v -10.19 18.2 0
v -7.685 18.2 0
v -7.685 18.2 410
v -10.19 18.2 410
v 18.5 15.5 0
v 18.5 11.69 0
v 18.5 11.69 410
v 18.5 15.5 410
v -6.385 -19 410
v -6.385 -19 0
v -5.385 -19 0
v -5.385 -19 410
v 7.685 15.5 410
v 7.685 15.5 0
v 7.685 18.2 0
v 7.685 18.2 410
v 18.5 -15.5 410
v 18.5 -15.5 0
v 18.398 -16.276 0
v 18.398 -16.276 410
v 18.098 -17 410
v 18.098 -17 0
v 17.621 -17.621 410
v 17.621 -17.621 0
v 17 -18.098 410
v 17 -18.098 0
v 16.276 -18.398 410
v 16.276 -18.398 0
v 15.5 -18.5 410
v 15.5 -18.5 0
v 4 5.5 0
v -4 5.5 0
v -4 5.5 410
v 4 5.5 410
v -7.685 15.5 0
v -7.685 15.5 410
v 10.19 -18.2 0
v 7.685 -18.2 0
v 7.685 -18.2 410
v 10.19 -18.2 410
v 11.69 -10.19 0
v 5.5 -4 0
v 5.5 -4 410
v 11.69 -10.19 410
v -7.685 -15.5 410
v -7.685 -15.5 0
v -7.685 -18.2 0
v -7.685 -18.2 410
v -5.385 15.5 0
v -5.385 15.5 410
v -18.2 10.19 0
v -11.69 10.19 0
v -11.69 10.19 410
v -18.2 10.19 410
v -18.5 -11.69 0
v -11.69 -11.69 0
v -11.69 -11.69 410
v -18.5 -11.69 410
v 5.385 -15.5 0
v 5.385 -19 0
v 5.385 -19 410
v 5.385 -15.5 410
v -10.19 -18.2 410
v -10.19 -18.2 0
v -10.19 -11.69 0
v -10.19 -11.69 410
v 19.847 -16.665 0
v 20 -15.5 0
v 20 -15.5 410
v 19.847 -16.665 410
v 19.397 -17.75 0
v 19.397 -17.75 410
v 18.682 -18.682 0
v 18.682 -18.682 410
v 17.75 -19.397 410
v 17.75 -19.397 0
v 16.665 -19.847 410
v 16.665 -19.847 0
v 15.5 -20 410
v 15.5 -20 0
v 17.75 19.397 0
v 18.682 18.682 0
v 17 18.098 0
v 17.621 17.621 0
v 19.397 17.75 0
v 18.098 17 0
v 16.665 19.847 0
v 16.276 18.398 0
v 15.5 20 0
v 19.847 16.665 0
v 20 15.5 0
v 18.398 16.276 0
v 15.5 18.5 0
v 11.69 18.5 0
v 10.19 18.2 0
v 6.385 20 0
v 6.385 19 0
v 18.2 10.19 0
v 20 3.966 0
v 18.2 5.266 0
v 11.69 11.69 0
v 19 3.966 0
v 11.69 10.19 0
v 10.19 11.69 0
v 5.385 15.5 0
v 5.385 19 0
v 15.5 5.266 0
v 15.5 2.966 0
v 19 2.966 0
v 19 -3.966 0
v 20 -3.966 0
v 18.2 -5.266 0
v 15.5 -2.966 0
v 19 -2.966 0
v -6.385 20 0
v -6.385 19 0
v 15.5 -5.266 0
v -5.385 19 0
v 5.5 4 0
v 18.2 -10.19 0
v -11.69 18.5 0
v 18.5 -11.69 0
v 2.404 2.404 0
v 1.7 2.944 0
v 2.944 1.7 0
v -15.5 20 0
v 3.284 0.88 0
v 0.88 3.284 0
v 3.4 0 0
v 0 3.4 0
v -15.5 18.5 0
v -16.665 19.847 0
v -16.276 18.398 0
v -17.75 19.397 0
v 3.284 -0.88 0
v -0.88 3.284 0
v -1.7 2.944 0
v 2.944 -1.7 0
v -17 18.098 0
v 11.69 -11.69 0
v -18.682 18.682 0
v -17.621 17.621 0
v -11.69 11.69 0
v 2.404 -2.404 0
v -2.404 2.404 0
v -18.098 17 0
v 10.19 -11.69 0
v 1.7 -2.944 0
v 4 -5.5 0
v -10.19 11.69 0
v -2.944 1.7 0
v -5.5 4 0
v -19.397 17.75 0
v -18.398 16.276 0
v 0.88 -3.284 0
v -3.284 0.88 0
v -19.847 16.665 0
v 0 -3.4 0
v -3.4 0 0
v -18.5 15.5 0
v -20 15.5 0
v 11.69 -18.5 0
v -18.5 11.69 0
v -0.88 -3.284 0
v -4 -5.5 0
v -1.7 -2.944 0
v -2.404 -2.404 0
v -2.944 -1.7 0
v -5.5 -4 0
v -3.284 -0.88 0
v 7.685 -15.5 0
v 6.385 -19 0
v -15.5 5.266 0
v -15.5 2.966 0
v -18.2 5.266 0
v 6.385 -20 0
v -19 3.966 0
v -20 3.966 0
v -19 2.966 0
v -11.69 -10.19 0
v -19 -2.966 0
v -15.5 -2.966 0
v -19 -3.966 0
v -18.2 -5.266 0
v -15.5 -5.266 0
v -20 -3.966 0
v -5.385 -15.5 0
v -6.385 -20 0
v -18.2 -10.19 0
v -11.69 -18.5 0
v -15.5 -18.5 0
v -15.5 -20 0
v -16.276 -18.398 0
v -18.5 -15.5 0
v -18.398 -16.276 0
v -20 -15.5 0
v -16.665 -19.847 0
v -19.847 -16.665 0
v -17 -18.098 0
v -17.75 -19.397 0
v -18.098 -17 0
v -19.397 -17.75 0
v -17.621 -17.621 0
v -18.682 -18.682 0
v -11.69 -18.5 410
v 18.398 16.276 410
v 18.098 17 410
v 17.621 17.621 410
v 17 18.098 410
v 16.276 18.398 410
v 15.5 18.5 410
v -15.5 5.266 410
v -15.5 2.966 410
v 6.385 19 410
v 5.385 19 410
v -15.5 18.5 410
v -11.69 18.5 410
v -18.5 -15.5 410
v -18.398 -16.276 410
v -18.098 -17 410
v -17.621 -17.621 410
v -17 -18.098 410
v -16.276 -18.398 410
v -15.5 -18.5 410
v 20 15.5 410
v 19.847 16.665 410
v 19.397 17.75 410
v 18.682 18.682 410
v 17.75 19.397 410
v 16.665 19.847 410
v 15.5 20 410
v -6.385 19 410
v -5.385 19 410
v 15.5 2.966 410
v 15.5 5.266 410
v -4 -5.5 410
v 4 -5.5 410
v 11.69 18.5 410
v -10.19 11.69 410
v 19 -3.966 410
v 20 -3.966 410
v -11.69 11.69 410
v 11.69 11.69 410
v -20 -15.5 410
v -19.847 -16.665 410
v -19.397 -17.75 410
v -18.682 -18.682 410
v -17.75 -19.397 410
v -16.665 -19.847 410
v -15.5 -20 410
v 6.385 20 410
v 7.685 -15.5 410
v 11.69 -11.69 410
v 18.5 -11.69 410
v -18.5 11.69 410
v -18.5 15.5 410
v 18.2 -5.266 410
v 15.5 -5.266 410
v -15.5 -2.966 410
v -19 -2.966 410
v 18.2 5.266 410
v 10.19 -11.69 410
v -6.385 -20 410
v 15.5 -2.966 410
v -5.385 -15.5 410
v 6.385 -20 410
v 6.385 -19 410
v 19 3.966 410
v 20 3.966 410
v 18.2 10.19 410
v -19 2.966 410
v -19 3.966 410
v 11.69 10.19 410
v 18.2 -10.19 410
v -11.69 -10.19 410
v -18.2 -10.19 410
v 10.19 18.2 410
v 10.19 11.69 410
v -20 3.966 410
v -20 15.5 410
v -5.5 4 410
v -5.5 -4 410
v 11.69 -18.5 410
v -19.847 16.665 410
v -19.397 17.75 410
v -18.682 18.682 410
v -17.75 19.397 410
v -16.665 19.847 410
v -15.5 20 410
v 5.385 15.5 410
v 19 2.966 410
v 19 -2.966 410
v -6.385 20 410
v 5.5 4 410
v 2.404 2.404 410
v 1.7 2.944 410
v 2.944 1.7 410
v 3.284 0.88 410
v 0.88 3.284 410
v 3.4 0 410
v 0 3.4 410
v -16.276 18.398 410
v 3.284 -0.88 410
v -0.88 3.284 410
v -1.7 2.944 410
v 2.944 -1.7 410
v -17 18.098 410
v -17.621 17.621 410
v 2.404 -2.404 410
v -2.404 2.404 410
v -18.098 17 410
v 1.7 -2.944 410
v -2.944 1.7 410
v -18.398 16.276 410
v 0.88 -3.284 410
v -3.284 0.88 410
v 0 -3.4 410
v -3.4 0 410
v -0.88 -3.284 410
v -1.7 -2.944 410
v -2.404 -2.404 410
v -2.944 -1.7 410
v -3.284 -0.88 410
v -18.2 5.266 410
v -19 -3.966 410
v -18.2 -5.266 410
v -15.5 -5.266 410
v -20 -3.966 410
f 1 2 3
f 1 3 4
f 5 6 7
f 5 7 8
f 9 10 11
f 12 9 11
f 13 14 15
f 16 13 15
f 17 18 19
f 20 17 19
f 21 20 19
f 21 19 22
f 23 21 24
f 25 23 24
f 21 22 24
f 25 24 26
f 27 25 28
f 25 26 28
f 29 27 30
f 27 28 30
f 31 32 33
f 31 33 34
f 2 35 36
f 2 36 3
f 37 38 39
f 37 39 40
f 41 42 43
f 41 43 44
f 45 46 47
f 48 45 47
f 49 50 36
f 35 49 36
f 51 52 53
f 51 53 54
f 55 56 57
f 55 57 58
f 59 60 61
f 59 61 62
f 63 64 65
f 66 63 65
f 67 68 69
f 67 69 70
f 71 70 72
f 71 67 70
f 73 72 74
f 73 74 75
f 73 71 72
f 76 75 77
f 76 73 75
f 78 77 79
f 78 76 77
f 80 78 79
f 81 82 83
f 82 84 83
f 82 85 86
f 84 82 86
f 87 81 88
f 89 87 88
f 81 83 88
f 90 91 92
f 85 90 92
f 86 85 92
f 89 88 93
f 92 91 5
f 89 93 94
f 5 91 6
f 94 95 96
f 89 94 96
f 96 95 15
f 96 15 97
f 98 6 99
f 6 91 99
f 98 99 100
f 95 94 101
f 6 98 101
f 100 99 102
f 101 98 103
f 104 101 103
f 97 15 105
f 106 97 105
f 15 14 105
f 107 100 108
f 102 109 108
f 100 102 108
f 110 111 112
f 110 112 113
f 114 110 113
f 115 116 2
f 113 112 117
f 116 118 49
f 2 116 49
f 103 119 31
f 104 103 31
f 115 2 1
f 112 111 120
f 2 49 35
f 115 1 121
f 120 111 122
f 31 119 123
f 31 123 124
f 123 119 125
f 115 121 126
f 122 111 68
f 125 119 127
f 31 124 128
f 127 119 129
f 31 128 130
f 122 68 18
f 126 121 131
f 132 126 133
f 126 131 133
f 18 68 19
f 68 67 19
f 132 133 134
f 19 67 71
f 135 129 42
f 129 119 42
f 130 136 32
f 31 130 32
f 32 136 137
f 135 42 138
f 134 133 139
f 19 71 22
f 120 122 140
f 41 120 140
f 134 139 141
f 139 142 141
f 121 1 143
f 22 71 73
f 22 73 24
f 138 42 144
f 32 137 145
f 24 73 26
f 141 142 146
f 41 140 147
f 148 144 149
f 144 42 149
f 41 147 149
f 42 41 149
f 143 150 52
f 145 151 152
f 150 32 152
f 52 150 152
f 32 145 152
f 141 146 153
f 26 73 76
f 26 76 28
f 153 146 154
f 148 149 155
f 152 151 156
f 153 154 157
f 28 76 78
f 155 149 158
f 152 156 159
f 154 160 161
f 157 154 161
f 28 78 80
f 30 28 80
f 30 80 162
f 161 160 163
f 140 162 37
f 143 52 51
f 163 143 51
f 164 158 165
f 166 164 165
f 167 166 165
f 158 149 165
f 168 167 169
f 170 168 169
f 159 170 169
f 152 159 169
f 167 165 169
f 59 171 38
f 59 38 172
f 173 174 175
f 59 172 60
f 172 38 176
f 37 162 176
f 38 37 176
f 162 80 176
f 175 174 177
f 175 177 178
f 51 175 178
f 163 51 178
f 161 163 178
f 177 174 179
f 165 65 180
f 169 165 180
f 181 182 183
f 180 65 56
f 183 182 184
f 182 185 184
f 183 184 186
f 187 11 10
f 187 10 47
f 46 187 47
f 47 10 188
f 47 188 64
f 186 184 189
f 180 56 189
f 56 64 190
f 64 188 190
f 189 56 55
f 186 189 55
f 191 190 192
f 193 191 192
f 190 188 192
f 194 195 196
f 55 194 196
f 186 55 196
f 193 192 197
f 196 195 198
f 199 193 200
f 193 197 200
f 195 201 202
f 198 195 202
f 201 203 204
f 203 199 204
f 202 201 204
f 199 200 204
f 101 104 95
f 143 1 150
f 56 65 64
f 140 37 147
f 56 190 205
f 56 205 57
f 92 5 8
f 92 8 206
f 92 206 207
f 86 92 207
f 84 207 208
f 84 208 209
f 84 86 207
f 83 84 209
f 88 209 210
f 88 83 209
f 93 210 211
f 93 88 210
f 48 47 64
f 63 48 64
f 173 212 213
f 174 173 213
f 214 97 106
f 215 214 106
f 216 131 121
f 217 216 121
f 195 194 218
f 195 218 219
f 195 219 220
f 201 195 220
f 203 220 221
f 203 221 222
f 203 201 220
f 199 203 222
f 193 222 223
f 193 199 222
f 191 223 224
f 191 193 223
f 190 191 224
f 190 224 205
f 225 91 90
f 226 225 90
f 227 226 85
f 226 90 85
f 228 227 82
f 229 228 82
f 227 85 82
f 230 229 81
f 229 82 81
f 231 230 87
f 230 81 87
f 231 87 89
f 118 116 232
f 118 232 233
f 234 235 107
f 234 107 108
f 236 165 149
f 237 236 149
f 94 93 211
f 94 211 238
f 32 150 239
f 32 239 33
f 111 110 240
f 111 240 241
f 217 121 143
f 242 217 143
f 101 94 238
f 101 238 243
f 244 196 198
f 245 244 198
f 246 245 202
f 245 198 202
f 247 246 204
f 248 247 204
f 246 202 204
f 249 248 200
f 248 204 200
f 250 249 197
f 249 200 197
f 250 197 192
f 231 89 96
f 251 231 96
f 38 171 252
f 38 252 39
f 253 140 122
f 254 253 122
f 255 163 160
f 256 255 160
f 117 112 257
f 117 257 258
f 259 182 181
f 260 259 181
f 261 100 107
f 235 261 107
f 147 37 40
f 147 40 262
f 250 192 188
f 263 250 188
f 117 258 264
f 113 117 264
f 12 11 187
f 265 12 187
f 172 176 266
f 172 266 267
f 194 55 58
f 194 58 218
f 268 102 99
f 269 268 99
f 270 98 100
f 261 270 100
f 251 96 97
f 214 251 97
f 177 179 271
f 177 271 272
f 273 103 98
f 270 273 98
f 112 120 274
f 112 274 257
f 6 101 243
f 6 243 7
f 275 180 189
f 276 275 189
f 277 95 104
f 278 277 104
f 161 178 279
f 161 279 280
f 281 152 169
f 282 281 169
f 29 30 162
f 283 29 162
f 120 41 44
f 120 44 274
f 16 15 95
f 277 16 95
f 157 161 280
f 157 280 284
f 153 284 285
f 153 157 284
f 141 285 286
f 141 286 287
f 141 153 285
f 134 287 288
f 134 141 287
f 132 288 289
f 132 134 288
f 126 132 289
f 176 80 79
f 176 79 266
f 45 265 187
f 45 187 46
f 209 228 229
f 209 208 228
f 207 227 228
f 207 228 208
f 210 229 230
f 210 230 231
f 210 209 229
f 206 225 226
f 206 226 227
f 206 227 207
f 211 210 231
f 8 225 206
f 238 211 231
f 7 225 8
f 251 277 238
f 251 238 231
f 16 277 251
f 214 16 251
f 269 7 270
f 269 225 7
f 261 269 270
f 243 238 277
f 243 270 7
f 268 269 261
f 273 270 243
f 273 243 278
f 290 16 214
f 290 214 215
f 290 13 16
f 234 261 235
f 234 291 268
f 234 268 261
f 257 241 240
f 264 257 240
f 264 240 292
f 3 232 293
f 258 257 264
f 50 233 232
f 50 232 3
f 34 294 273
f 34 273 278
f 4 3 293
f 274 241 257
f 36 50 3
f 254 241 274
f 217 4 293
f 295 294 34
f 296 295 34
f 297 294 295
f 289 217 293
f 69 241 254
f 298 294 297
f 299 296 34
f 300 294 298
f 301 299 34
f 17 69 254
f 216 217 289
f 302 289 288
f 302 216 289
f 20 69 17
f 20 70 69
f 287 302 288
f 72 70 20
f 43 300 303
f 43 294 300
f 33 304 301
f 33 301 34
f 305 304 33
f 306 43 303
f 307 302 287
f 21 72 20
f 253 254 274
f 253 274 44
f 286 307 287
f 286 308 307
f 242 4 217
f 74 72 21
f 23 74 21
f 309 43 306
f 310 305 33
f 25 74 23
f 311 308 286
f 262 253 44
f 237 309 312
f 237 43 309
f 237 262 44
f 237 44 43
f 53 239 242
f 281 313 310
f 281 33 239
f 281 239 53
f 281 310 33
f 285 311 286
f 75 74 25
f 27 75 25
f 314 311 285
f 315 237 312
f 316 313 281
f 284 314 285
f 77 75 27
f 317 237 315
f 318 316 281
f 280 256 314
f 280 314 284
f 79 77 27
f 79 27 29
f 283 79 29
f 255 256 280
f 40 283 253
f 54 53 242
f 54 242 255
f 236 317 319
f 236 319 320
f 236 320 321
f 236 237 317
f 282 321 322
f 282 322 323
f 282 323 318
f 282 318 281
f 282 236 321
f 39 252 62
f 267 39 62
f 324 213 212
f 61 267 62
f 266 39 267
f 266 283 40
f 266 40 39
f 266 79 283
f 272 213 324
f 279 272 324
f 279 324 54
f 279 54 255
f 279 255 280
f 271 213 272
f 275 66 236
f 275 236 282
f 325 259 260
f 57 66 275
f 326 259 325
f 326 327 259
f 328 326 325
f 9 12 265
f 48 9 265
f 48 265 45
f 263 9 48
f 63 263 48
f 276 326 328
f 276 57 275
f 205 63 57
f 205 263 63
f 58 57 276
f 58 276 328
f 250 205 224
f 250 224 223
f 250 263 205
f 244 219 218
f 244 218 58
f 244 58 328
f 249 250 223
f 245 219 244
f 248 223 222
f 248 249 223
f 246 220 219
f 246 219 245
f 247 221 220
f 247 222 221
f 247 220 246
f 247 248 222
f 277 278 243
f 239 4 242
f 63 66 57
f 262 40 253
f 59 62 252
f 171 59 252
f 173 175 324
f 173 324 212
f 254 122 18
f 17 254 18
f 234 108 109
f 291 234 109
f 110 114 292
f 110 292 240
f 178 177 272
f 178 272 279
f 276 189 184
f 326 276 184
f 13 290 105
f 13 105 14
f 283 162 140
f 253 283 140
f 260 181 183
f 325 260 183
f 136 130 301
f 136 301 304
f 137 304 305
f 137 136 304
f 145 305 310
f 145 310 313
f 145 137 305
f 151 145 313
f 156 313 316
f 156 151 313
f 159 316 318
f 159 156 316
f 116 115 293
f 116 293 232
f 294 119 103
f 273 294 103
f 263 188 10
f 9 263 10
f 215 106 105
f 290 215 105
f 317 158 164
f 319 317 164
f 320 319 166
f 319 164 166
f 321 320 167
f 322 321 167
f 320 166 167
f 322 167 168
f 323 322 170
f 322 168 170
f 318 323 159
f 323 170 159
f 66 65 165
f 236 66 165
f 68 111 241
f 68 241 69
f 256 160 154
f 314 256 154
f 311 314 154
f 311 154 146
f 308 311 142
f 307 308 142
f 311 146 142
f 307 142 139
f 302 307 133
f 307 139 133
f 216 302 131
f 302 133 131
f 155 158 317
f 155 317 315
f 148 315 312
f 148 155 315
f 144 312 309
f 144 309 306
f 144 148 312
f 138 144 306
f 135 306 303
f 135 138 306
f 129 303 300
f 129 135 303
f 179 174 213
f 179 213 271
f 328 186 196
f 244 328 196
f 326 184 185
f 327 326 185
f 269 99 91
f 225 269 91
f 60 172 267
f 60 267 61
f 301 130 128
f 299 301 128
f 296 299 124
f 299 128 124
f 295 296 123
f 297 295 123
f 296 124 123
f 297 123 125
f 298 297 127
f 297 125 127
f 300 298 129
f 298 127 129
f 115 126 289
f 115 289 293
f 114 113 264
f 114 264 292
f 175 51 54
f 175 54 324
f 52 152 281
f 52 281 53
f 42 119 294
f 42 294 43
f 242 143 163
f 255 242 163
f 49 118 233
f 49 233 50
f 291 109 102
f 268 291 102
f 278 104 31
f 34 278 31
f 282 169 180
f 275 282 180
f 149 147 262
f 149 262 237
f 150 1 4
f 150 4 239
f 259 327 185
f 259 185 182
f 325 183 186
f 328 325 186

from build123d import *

# Parameters (mm, degrees)
BOSS_EXTRUDE1_DEPTH  = 410
MIRROR3_COPY_1_DEPTH = 410
MIRROR3_COPY_2_DEPTH = 410


with BuildPart() as part:
    # Sketch1 → Boss-Extrude1 (new body)
    with BuildSketch(Plane.XY):
        with BuildLine():
            Line((3.4, 0), (5.5, 0))
            Line((5.5, 0), (5.5, 4))
            Line((5.5, 4), (11.69, 10.19))
            Line((11.69, 10.19), (18.2, 10.19))
            Line((18.2, 10.19), (18.2, 5.265595036))
            Line((18.2, 5.265595036), (15.5, 5.265595036))
            Line((15.5, 5.265595036), (15.5, 2.965595036))
            Line((15.5, 2.965595036), (19, 2.965595036))
            Line((19, 2.965595036), (19, 3.965595036))
            Line((19, 3.965595036), (20, 3.965595036))
            Line((20, 3.965595036), (20, 15.5))
            ThreePointArc((20, 15.5), (18.681980515, 18.681980515), (15.5, 20))
            Line((15.5, 20), (6.385304712, 20))
            Line((6.385304712, 20), (6.385304712, 19))
            Line((6.385304712, 19), (5.385304712, 19))
            Line((5.385304712, 19), (5.385304712, 15.5))
            Line((5.385304712, 15.5), (7.685304712, 15.5))
            Line((7.685304712, 15.5), (7.685304712, 18.2))
            Line((7.685304712, 18.2), (10.19, 18.2))
            Line((10.19, 18.2), (10.19, 11.69))
            Line((10.19, 11.69), (4, 5.5))
            Line((4, 5.5), (0, 5.5))
            Line((0, 5.5), (0, 3.4))
            ThreePointArc((0, 3.4), (2.404163056, 2.404163056), (3.4, 0))
        make_face()
        with BuildLine():
            Line((18.5, 11.69), (18.5, 15.5))
            ThreePointArc((18.5, 15.5), (17.621320344, 17.621320344), (15.5, 18.5))
            Line((15.5, 18.5), (11.69, 18.5))
            Line((11.69, 18.5), (11.69, 11.69))
            Line((11.69, 11.69), (18.5, 11.69))
        make_face(mode=Mode.SUBTRACT)
    boss_extrude1 = extrude(amount=BOSS_EXTRUDE1_DEPTH)

    # Mirror1: Boss-Extrude1 across plane
    add(boss_extrude1.mirror(Plane.ZX))

    # Mirror2: Boss-Extrude1 across plane
    add(boss_extrude1.mirror(Plane(origin=(0, 0, 0), x_dir=(0, 0, 1), z_dir=(1, 0, 0))))

    # Mirror3 copy 1 sketch → Mirror3 copy 1 (add)
    with BuildSketch(Plane(origin=(0, 0, 0), x_dir=(-1, 0, 0), z_dir=(0, 0, 1))):
        with BuildLine():
            Line((3.4, 0), (5.5, 0))
            Line((5.5, 0), (5.5, 4))
            Line((5.5, 4), (11.69, 10.19))
            Line((11.69, 10.19), (18.2, 10.19))
            Line((18.2, 10.19), (18.2, 5.265595036))
            Line((18.2, 5.265595036), (15.5, 5.265595036))
            Line((15.5, 5.265595036), (15.5, 2.965595036))
            Line((15.5, 2.965595036), (19, 2.965595036))
            Line((19, 2.965595036), (19, 3.965595036))
            Line((19, 3.965595036), (20, 3.965595036))
            Line((20, 3.965595036), (20, 15.5))
            ThreePointArc((20, 15.5), (18.681980515, 18.681980515), (15.5, 20))
            Line((15.5, 20), (6.385304712, 20))
            Line((6.385304712, 20), (6.385304712, 19))
            Line((6.385304712, 19), (5.385304712, 19))
            Line((5.385304712, 19), (5.385304712, 15.5))
            Line((5.385304712, 15.5), (7.685304712, 15.5))
            Line((7.685304712, 15.5), (7.685304712, 18.2))
            Line((7.685304712, 18.2), (10.19, 18.2))
            Line((10.19, 18.2), (10.19, 11.69))
            Line((10.19, 11.69), (4, 5.5))
            Line((4, 5.5), (0, 5.5))
            Line((0, 5.5), (0, 3.4))
            ThreePointArc((0, 3.4), (2.404163056, 2.404163056), (3.4, 0))
        make_face()
        with BuildLine():
            Line((18.5, 11.69), (18.5, 15.5))
            ThreePointArc((18.5, 15.5), (17.621320344, 17.621320344), (15.5, 18.5))
            Line((15.5, 18.5), (11.69, 18.5))
            Line((11.69, 18.5), (11.69, 11.69))
            Line((11.69, 11.69), (18.5, 11.69))
        make_face(mode=Mode.SUBTRACT)
    extrude(amount=MIRROR3_COPY_1_DEPTH)

    # Mirror3 copy 2 sketch → Mirror3 copy 2 (add)
    with BuildSketch(Plane.XY):
        with BuildLine():
            Line((3.4, 0), (5.5, 0))
            Line((5.5, 0), (5.5, -4))
            Line((5.5, -4), (11.69, -10.19))
            Line((11.69, -10.19), (18.2, -10.19))
            Line((18.2, -10.19), (18.2, -5.265595036))
            Line((18.2, -5.265595036), (15.5, -5.265595036))
            Line((15.5, -5.265595036), (15.5, -2.965595036))
            Line((15.5, -2.965595036), (19, -2.965595036))
            Line((19, -2.965595036), (19, -3.965595036))
            Line((19, -3.965595036), (20, -3.965595036))
            Line((20, -3.965595036), (20, -15.5))
            ThreePointArc((20, -15.5), (18.681980515, -18.681980515), (15.5, -20))
            Line((15.5, -20), (6.385304712, -20))
            Line((6.385304712, -20), (6.385304712, -19))
            Line((6.385304712, -19), (5.385304712, -19))
            Line((5.385304712, -19), (5.385304712, -15.5))
            Line((5.385304712, -15.5), (7.685304712, -15.5))
            Line((7.685304712, -15.5), (7.685304712, -18.2))
            Line((7.685304712, -18.2), (10.19, -18.2))
            Line((10.19, -18.2), (10.19, -11.69))
            Line((10.19, -11.69), (4, -5.5))
            Line((4, -5.5), (0, -5.5))
            Line((0, -5.5), (0, -3.4))
            ThreePointArc((0, -3.4), (2.404163056, -2.404163056), (3.4, 0))
        make_face()
        with BuildLine():
            Line((18.5, -11.69), (18.5, -15.5))
            ThreePointArc((18.5, -15.5), (17.621320344, -17.621320344), (15.5, -18.5))
            Line((15.5, -18.5), (11.69, -18.5))
            Line((11.69, -18.5), (11.69, -11.69))
            Line((11.69, -11.69), (18.5, -11.69))
        make_face(mode=Mode.SUBTRACT)
    extrude(amount=MIRROR3_COPY_2_DEPTH)


solid = part.part
